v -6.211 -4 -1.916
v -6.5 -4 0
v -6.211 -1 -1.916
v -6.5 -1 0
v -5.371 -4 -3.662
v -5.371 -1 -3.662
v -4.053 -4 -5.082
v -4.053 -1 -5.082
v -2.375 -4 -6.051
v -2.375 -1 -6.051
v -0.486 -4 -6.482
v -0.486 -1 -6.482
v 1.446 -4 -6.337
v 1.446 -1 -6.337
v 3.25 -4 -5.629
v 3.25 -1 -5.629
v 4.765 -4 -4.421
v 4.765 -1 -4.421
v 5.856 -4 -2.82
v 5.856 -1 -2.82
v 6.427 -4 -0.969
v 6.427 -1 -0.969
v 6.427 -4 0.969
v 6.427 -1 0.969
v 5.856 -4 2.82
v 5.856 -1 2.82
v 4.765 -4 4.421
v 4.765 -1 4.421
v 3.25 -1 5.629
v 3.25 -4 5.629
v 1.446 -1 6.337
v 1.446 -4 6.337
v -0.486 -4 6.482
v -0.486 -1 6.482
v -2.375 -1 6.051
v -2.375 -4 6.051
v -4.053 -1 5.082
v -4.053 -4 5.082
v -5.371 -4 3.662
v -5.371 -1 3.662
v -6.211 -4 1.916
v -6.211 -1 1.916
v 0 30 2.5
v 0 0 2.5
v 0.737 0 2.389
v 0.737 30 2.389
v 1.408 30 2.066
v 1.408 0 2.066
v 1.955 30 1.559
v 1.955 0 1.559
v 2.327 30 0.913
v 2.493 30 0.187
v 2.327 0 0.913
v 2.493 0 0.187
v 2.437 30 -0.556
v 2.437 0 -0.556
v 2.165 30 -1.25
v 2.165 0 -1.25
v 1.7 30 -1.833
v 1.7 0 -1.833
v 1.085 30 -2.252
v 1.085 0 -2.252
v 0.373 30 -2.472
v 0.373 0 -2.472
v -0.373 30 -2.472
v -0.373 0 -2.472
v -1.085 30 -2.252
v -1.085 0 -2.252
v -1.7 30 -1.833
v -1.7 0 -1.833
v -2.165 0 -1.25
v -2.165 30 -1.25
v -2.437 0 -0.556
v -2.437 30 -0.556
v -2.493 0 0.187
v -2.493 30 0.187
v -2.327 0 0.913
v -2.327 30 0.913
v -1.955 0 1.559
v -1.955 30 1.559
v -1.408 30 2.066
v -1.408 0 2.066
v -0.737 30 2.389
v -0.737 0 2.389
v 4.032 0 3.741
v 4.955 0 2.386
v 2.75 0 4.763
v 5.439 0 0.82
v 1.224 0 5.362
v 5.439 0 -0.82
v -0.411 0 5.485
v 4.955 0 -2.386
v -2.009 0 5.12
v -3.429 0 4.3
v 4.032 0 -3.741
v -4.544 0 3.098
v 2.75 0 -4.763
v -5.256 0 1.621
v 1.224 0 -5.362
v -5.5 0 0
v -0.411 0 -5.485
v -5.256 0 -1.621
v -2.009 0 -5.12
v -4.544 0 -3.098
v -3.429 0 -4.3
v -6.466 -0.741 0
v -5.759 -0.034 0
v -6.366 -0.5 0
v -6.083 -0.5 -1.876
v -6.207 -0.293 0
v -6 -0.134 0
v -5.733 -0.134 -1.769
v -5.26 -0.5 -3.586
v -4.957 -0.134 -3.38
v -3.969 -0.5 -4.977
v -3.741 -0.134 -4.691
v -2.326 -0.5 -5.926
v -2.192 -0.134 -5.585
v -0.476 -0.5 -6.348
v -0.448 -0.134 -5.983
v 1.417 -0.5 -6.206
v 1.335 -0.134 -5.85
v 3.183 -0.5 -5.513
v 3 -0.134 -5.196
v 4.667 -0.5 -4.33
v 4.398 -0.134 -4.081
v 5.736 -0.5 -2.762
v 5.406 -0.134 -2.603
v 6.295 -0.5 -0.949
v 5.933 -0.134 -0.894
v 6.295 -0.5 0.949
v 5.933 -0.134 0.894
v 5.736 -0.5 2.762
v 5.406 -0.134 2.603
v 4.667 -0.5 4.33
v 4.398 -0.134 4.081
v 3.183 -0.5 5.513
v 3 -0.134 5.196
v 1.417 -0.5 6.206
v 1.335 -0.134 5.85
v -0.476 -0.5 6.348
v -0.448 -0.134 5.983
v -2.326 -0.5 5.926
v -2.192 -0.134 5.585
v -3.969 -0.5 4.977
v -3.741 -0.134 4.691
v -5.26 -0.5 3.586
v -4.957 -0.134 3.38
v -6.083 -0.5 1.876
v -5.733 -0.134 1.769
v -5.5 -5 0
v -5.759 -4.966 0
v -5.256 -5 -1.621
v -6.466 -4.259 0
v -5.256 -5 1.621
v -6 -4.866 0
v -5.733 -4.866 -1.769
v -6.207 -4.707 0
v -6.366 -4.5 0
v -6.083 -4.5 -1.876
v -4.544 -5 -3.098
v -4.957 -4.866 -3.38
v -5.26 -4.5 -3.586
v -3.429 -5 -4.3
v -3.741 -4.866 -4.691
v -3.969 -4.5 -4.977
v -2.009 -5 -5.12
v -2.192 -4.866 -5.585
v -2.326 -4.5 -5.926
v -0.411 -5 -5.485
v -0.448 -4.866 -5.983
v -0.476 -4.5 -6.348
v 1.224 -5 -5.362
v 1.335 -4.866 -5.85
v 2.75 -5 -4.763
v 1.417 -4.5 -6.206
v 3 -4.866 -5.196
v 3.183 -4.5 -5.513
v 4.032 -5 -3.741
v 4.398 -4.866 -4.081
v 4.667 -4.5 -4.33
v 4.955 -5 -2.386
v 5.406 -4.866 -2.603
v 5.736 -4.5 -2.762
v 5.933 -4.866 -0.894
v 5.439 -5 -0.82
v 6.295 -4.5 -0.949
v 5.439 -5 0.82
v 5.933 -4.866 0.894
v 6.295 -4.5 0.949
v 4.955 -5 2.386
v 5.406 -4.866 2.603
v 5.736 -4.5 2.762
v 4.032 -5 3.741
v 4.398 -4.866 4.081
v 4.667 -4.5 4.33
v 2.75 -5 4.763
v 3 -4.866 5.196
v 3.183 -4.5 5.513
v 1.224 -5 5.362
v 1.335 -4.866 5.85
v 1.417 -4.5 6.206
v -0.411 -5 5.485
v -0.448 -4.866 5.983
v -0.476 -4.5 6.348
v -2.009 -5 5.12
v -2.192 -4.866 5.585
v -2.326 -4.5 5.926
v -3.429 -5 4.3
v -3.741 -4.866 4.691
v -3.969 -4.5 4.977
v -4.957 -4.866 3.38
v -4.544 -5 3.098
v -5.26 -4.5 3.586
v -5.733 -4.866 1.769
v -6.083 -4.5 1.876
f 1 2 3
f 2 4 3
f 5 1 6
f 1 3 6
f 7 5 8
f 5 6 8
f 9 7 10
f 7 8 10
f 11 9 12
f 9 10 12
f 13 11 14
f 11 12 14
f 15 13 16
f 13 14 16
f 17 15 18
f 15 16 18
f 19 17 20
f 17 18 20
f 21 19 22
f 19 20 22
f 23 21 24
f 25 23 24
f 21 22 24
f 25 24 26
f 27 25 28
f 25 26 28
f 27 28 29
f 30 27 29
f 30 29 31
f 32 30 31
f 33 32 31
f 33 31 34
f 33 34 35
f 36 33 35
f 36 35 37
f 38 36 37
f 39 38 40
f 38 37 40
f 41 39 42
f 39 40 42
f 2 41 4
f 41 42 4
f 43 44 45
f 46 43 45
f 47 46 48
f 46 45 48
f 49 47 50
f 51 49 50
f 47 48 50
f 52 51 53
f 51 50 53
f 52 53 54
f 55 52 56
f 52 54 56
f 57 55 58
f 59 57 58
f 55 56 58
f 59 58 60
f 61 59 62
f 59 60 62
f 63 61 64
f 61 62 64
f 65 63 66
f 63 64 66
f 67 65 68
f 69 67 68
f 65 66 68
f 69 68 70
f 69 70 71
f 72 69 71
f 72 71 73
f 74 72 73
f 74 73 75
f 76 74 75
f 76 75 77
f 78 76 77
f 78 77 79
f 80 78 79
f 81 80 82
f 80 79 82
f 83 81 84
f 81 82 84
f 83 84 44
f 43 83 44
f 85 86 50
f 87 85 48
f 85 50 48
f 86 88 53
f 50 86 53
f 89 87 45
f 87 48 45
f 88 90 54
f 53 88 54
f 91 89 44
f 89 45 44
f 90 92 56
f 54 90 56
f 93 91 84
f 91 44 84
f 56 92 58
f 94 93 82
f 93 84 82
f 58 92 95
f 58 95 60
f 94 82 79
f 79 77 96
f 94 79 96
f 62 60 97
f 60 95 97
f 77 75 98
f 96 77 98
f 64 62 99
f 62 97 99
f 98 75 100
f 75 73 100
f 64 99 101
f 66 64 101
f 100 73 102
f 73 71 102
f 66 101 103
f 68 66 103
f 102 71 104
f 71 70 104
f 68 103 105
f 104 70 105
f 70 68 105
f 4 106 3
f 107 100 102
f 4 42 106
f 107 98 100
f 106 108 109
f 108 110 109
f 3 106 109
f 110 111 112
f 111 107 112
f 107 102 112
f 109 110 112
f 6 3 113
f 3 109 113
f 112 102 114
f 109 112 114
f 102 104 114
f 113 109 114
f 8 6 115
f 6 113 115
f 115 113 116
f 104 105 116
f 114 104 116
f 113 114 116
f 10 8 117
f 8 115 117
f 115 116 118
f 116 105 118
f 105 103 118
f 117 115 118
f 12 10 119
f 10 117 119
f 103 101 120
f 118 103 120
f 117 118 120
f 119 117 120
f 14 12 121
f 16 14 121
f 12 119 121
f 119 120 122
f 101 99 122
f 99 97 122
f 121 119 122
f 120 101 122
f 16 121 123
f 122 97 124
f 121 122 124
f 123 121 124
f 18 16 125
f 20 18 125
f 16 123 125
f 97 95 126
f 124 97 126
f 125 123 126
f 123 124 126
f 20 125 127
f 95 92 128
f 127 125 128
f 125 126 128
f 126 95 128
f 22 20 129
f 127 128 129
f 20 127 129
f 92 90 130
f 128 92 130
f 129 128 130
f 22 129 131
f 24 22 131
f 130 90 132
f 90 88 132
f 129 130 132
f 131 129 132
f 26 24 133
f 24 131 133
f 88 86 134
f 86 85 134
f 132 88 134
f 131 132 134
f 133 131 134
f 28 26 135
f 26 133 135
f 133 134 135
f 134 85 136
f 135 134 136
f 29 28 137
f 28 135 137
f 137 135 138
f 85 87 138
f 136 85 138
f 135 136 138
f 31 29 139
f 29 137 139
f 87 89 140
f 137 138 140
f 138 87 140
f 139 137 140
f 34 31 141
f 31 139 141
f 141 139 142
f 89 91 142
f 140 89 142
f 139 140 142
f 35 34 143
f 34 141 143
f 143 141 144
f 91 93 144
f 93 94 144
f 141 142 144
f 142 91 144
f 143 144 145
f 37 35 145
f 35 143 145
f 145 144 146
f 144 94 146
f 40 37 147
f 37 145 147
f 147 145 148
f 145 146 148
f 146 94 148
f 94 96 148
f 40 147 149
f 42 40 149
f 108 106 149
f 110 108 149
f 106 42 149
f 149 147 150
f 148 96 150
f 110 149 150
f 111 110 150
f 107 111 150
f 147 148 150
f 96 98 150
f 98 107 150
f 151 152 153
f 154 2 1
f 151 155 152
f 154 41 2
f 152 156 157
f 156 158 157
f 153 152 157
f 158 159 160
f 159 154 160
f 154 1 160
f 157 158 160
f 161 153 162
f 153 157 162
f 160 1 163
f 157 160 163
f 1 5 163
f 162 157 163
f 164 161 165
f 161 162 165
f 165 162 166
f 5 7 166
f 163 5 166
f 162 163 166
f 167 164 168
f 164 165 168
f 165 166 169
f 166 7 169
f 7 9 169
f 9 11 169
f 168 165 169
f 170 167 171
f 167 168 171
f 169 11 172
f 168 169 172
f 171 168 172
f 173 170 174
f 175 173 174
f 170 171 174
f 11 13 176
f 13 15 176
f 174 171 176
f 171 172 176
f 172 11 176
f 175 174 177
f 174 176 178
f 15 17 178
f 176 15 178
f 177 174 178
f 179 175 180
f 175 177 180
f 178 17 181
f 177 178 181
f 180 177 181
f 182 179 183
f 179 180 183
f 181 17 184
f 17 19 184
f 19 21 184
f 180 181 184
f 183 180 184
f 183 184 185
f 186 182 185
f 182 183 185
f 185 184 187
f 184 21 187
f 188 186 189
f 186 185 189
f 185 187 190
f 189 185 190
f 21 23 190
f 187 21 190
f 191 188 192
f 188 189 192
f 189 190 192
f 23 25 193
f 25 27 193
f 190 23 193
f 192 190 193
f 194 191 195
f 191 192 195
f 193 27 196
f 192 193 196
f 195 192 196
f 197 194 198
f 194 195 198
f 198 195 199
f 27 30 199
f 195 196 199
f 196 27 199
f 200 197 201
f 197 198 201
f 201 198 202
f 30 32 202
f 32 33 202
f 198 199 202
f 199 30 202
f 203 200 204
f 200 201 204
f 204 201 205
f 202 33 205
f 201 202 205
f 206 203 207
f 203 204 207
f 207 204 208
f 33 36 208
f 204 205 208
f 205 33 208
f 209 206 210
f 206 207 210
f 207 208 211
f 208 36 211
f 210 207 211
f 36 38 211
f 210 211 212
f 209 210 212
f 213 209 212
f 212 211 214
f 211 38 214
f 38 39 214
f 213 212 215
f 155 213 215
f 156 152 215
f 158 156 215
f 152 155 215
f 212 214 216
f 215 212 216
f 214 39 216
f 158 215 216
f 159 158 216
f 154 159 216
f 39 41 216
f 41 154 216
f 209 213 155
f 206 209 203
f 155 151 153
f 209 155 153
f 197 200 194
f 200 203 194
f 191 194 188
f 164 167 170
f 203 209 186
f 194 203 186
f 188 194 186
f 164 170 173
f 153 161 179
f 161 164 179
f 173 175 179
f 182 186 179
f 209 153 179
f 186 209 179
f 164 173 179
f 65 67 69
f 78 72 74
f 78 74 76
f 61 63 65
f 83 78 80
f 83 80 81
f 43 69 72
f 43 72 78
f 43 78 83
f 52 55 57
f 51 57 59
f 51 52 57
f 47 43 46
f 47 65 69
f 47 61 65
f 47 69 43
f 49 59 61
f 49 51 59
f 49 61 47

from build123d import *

# Parameters (mm, degrees)
SKETCH1_R           = 2.5
BOSS_EXTRUDE1_DEPTH = 30


with BuildPart() as part:
    # Sketch1 → Boss-Extrude1 (new body)
    with BuildSketch(Plane(origin=(0, 0, 0), x_dir=(1, 0, 0), z_dir=(0, 1, 0))):
        with Locations(Location((0, 0, 0), (0, 0, 270))):
            Circle(SKETCH1_R)
    extrude(amount=BOSS_EXTRUDE1_DEPTH)

    # Sketch2 → Revolve1 (revolve)
    with BuildSketch(Plane.XY):
        with BuildLine():
            Line((0, 0), (0, -5))
            Line((0, -5), (-5.5, -5))
            ThreePointArc((-5.5, -5), (-6.207106781, -4.707106781), (-6.5, -4))
            Line((-6.5, -4), (-6.5, -1))
            ThreePointArc((-6.5, -1), (-6.207106781, -0.292893219), (-5.5, 0))
            Line((-5.5, 0), (0, 0))
        make_face()
    revolve(axis=Axis((0, 0, 0), (0, -1, 0)))


solid = part.part
